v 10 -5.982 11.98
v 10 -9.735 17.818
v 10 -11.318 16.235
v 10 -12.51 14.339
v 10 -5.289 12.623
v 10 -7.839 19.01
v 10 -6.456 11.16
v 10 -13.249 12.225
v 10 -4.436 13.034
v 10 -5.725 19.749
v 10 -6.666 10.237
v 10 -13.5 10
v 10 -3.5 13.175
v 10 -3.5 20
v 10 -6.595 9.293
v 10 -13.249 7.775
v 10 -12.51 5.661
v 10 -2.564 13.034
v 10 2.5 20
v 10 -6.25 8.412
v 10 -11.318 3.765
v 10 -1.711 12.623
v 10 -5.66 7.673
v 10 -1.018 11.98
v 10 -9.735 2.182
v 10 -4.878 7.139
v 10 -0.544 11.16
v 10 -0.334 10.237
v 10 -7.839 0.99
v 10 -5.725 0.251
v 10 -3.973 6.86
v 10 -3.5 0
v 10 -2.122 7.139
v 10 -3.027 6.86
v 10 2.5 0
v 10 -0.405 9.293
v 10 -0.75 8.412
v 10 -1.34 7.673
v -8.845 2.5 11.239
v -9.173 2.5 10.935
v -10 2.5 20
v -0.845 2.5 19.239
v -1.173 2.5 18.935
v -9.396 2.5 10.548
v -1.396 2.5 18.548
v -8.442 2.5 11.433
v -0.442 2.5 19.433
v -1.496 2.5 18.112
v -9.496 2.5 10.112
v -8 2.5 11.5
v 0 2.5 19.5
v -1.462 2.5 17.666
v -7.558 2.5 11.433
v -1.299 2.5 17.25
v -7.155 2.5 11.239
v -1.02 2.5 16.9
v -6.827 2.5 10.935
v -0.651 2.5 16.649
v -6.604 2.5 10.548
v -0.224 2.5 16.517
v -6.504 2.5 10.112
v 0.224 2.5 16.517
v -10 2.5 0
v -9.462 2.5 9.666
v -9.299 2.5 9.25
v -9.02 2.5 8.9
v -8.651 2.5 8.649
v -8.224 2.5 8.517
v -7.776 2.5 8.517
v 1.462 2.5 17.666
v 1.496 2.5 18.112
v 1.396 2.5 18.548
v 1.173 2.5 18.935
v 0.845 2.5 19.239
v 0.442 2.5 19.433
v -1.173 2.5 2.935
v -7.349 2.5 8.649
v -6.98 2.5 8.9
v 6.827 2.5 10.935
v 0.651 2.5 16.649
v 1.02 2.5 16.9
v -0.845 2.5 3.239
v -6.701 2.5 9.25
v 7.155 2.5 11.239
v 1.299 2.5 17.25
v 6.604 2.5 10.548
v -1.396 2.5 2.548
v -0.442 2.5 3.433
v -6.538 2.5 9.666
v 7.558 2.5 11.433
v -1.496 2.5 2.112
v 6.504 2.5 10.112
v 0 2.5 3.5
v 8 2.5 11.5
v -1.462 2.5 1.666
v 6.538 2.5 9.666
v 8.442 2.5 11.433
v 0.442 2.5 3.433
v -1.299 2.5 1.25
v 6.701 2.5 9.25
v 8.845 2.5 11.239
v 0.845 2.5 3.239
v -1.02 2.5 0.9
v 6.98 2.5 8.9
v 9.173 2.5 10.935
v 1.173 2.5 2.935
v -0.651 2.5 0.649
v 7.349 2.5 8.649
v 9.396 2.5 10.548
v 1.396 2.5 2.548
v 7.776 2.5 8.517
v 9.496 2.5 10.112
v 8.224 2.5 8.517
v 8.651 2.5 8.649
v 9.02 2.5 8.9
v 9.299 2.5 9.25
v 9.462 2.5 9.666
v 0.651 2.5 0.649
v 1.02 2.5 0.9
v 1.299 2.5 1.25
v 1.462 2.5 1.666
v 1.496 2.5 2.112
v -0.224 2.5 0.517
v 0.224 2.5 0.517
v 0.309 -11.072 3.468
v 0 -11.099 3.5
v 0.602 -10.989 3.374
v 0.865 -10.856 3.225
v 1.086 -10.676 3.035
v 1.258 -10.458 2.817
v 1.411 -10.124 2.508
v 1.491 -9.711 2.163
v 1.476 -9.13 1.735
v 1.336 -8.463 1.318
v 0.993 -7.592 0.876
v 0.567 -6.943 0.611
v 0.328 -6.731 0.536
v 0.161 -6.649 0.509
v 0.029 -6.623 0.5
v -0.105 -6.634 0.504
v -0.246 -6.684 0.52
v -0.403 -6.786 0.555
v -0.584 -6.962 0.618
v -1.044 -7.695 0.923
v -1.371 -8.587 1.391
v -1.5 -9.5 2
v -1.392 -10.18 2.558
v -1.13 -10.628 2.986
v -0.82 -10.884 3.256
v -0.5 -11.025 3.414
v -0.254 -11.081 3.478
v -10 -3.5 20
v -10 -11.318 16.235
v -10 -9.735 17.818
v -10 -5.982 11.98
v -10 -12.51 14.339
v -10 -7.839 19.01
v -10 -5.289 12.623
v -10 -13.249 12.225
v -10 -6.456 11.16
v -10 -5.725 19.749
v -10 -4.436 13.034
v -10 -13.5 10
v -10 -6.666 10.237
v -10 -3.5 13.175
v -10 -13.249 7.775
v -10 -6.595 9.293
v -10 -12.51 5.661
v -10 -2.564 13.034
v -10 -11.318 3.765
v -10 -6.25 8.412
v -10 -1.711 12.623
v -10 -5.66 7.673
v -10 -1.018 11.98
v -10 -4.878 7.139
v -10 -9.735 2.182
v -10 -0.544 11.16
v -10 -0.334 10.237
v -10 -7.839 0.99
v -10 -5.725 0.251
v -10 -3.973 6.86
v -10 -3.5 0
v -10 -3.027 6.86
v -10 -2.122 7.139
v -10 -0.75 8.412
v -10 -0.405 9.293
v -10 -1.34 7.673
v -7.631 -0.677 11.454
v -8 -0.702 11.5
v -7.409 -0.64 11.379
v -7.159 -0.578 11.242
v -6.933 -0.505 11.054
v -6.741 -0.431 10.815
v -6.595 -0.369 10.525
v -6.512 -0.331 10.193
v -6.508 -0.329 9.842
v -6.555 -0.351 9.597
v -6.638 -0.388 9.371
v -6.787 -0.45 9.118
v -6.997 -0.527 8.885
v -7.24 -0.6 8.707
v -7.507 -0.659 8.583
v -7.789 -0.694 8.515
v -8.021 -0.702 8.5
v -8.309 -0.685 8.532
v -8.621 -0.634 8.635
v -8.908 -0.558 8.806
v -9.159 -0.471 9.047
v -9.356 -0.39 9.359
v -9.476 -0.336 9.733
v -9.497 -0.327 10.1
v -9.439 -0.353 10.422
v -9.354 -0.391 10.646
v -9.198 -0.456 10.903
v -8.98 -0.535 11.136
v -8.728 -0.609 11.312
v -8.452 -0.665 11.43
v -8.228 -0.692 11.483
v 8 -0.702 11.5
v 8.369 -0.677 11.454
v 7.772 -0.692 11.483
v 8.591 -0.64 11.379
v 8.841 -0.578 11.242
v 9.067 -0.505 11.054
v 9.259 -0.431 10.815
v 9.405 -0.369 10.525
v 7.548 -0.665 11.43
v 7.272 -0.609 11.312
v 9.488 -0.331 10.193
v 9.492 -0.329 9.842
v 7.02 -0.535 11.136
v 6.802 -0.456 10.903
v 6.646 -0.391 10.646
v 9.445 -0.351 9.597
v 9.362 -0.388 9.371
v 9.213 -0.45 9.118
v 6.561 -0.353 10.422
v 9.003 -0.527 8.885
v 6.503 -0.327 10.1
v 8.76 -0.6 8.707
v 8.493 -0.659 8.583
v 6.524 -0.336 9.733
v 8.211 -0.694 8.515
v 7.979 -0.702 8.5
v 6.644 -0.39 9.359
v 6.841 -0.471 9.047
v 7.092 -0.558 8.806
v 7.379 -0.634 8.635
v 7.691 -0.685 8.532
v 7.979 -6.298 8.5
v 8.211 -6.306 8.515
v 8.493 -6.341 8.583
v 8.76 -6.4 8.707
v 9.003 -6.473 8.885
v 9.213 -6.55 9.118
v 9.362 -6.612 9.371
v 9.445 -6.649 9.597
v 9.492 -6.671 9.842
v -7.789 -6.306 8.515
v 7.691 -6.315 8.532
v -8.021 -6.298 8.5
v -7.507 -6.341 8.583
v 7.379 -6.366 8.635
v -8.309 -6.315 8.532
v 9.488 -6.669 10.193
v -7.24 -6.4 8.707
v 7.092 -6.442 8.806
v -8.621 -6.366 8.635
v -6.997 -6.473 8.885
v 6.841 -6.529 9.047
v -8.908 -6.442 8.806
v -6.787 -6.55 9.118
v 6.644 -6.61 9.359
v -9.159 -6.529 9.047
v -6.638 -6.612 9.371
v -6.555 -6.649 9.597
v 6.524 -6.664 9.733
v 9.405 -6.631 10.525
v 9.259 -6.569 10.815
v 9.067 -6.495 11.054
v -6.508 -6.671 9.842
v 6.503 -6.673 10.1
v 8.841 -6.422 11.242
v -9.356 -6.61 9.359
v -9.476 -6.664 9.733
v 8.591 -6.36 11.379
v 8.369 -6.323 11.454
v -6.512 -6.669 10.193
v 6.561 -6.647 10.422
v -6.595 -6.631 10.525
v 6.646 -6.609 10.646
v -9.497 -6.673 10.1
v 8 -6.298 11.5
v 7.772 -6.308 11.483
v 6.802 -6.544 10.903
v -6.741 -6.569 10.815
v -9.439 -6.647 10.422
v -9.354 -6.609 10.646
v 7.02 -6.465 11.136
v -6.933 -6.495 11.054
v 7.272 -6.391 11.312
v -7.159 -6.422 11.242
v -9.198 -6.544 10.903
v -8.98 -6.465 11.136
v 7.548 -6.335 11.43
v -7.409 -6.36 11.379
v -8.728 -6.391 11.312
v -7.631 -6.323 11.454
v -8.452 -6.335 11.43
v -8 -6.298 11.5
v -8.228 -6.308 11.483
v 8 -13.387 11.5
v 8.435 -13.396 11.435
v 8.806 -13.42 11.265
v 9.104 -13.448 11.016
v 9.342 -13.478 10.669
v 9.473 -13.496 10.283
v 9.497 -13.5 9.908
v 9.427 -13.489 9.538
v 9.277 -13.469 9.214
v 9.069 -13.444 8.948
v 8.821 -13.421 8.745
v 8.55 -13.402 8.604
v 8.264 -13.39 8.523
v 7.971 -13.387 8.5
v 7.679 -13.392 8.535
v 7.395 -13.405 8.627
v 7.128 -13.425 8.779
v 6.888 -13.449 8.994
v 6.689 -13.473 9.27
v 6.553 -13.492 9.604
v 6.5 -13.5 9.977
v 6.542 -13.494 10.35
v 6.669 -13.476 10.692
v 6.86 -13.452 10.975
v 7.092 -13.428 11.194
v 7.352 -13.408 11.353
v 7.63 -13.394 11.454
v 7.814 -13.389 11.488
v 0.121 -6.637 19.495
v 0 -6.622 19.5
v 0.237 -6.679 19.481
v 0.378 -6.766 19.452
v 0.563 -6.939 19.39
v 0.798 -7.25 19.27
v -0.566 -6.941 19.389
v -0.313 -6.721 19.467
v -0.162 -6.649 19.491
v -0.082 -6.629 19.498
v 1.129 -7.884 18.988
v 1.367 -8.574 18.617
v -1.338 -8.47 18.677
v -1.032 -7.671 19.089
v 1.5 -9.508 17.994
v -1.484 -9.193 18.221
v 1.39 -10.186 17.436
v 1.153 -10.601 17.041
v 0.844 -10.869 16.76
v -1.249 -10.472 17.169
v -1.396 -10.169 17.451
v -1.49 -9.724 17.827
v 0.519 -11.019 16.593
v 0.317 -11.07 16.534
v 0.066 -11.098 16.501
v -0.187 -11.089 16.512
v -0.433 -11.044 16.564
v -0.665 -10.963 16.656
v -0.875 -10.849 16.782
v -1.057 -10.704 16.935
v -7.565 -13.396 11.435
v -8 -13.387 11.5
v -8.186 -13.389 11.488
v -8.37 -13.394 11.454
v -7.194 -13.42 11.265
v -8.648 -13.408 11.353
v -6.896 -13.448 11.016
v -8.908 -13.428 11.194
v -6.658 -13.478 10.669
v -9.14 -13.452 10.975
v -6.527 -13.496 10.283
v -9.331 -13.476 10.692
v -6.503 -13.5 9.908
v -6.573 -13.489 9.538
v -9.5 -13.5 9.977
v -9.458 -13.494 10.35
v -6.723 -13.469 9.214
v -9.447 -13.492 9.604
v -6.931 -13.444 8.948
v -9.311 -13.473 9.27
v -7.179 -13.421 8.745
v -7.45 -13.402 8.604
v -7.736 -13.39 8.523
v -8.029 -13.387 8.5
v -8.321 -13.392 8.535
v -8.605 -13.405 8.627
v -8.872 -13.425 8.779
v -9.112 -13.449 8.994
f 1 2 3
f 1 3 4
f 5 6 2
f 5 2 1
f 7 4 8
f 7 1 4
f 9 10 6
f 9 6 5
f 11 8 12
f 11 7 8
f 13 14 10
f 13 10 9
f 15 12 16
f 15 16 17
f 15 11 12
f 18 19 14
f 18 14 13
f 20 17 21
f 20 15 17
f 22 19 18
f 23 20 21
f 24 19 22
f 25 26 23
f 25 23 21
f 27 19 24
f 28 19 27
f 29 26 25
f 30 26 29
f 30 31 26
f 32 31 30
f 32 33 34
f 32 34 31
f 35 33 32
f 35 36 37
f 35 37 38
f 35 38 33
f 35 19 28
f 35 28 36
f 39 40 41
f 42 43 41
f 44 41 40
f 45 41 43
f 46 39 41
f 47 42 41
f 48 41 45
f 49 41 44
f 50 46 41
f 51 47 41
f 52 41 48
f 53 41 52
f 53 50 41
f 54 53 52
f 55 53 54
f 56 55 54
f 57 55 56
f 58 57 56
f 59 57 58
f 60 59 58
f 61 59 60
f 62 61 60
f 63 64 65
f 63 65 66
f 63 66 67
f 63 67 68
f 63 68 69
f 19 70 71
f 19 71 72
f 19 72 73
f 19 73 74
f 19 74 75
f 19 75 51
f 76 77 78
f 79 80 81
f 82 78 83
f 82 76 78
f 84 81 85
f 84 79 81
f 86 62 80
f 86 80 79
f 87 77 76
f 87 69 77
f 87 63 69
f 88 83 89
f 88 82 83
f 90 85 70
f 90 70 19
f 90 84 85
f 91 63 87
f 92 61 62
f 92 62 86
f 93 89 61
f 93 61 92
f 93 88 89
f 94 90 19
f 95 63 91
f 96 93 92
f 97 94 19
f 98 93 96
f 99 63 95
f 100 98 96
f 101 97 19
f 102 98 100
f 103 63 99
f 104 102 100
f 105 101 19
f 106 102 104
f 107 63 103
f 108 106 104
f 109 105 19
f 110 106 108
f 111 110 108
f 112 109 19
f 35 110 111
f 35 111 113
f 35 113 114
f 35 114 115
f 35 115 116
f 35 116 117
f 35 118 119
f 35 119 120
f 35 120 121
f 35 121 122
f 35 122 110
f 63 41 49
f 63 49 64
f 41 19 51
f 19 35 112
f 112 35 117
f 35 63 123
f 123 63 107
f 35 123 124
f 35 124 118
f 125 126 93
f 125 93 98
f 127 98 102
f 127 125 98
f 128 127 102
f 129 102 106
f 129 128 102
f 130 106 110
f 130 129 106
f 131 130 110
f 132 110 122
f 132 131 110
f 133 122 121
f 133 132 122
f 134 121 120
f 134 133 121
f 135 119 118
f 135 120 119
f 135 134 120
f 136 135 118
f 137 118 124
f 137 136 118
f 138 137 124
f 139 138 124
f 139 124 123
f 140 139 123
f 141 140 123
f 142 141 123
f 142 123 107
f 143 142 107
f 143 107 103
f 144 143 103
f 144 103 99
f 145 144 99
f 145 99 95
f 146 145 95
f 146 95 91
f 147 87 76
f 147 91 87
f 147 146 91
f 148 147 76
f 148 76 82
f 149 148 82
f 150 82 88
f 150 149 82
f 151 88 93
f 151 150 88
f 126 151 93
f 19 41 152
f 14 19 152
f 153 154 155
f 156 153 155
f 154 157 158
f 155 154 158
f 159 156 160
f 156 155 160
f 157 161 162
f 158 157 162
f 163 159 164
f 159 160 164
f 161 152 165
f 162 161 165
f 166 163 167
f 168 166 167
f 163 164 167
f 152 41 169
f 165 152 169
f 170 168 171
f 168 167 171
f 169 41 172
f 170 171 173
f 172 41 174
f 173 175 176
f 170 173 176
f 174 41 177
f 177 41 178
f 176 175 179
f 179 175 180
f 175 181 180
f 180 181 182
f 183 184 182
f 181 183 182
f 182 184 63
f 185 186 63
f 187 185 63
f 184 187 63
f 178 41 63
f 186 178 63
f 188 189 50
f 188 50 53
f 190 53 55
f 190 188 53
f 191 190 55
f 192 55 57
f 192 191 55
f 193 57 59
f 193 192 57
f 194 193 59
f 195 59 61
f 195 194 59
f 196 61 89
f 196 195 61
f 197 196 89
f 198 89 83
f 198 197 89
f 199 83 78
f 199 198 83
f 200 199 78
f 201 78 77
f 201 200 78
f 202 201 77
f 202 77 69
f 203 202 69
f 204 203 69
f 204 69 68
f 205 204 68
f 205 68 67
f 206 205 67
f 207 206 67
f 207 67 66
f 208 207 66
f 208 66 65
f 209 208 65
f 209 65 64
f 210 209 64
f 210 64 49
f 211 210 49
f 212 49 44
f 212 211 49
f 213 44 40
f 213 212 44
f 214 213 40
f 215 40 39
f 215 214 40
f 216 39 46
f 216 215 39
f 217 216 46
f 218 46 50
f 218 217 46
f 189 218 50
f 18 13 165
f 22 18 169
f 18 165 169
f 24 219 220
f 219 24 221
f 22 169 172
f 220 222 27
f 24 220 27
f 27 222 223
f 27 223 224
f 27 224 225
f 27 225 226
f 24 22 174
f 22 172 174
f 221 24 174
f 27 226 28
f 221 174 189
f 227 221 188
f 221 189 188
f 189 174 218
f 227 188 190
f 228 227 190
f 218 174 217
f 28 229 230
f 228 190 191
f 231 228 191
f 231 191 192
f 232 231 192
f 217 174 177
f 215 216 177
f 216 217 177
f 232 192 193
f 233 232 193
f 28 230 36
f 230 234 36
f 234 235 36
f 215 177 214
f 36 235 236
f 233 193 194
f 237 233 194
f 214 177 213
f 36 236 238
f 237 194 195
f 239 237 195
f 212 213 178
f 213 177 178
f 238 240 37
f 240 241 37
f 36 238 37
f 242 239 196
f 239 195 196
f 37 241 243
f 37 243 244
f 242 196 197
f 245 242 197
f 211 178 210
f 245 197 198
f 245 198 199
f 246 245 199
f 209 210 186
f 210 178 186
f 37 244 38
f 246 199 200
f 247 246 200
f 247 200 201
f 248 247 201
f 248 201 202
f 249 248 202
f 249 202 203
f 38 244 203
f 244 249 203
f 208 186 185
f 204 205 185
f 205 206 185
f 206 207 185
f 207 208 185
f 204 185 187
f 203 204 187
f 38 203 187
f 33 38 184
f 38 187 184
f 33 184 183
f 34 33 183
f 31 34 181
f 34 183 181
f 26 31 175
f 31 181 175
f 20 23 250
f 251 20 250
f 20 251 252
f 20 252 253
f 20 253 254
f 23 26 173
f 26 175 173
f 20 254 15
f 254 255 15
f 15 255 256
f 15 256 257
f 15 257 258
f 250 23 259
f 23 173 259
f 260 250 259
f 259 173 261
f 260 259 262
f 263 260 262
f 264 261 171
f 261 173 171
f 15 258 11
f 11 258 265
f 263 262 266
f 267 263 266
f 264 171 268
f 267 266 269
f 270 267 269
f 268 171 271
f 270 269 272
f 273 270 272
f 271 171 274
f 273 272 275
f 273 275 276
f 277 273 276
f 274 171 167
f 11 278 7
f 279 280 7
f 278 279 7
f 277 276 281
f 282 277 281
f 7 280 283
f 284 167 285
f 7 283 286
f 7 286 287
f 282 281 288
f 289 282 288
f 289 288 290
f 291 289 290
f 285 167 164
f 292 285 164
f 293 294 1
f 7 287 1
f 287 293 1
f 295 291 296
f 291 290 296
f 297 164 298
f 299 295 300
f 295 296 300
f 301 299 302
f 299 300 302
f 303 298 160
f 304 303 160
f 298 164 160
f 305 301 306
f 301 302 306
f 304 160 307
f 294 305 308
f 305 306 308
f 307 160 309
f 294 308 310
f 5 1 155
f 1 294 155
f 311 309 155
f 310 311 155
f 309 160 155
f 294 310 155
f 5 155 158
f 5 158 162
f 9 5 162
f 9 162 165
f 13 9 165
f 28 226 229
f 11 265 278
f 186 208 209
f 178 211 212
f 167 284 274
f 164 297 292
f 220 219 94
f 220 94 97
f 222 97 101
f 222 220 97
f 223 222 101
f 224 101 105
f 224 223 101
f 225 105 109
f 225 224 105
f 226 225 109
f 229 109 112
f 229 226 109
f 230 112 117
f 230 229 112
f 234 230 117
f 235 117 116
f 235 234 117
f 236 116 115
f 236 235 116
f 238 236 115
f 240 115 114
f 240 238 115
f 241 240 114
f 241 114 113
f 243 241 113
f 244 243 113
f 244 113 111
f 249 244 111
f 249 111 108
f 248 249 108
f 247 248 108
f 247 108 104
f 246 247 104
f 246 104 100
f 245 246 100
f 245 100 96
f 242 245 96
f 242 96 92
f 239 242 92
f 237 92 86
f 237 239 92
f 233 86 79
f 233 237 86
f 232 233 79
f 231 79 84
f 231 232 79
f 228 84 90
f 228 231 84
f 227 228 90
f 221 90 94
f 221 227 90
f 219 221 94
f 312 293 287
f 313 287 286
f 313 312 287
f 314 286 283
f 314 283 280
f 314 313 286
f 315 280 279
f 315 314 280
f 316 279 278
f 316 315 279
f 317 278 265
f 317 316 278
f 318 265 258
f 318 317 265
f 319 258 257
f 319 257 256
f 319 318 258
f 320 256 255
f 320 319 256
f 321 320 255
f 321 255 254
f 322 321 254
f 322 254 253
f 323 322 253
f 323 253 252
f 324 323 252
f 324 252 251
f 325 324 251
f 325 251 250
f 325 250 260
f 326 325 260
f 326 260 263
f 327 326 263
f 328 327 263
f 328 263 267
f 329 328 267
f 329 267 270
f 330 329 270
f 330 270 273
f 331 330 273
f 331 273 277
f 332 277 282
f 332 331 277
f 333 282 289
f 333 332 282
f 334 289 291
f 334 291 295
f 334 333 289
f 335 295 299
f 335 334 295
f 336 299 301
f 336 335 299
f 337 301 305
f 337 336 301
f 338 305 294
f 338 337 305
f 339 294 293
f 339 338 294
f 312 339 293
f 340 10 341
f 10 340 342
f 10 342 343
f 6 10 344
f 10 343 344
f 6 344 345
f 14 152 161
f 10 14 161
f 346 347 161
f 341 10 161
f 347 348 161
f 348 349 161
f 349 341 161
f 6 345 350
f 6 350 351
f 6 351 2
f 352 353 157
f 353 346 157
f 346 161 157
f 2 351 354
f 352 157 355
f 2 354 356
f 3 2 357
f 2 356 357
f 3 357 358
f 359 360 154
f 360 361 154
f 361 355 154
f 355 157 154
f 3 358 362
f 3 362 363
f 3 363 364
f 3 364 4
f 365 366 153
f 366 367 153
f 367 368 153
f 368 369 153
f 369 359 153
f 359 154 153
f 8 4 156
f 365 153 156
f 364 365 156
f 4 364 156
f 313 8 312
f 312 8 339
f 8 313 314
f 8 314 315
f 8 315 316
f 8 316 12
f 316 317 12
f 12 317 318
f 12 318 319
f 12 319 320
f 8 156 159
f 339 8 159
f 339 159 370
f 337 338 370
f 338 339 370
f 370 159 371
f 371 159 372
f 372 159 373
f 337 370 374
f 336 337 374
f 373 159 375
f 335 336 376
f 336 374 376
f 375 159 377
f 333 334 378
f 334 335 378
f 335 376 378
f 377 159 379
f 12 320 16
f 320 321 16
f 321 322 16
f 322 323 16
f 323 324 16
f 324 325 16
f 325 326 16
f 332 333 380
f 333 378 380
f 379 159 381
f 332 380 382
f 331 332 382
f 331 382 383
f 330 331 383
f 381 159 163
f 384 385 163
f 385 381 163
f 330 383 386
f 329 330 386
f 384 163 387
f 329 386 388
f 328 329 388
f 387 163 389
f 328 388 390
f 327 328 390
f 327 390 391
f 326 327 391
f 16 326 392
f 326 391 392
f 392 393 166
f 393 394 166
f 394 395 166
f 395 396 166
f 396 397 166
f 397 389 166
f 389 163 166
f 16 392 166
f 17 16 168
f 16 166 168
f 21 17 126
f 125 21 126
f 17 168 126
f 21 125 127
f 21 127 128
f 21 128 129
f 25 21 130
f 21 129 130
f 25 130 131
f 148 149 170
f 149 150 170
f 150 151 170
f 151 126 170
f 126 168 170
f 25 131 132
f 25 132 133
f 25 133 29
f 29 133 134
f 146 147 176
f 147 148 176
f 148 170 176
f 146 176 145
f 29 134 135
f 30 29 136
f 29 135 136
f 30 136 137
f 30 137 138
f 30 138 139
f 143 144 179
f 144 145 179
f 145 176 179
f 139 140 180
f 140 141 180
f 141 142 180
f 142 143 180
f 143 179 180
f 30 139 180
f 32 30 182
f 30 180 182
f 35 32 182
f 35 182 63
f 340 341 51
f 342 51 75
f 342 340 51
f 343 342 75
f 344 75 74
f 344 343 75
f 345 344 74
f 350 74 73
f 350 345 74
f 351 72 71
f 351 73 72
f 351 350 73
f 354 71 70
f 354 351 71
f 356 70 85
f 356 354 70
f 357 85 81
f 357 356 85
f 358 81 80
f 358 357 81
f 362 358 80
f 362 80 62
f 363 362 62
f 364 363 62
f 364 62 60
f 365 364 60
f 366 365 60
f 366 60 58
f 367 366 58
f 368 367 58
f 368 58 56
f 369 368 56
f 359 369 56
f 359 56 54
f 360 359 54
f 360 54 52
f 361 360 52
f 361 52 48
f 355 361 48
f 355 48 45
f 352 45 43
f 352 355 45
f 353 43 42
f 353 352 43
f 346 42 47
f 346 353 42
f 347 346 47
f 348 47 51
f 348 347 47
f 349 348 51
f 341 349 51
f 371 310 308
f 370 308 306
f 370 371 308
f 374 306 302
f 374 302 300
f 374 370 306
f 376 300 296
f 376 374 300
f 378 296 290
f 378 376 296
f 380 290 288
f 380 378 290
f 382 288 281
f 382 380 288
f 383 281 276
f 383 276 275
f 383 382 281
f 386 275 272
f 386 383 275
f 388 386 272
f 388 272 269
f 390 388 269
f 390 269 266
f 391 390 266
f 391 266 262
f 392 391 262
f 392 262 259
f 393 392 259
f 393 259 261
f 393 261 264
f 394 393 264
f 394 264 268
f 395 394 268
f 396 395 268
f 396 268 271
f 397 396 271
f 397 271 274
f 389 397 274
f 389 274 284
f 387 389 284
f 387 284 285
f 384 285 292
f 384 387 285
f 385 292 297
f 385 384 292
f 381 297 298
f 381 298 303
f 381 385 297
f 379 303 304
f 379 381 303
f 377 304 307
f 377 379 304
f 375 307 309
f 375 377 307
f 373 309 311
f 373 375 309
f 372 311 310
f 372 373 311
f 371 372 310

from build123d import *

# Parameters (mm, degrees)
SKETCH1_W               = 20
SKETCH1_H               = 20
SKETCH1_R               = 1.5
SKETCH1_R_2             = 8
BOSS_EXTRUDE1_DEPTH     = 2.5
SKETCH2_R               = 3.175
BOSS_EXTRUDE2_DEPTH     = 20
CUT_EXTRUDE2_DEPTH      = 27.119915773
CUT_EXTRUDE2_DEPTH_BACK = 27.119915773
SKETCH1_3_R             = 1.5


with BuildPart() as part:
    # Sketch1 → Boss-Extrude1 (new body)
    # profile 1 of 18: a face of its own
    with BuildSketch(Plane(origin=(0, 0, 0), x_dir=(1, 0, 0), z_dir=(0, 1, 0))):
        with Locations((0, -10)):
            Rectangle(SKETCH1_W, SKETCH1_H)
        with Locations((0, -2)):
            Circle(SKETCH1_R, mode=Mode.SUBTRACT)
        with Locations((0, -10)):
            Circle(SKETCH1_R_2, mode=Mode.SUBTRACT)
        with Locations((8, -10)):
            Circle(SKETCH1_R, mode=Mode.SUBTRACT)
        with Locations((0, -18)):
            Circle(SKETCH1_R, mode=Mode.SUBTRACT)
        with Locations((-8, -10)):
            Circle(SKETCH1_R, mode=Mode.SUBTRACT)
    # profile 2 of 18: a face of its own
    with BuildSketch(Plane(origin=(0, 0, 0), x_dir=(1, 0, 0), z_dir=(0, 1, 0))):
        with Locations((8, -10)):
            Circle(SKETCH1_R)
    # profile 3 of 18: a face of its own
    with BuildSketch(Plane(origin=(0, 0, 0), x_dir=(1, 0, 0), z_dir=(0, 1, 0))):
        with Locations((0, -18)):
            Circle(SKETCH1_R)
    # profile 4 of 18: a face of its own
    with BuildSketch(Plane(origin=(0, 0, 0), x_dir=(1, 0, 0), z_dir=(0, 1, 0))):
        with Locations((-8, -10)):
            Circle(SKETCH1_R)
    # profile 5 of 18: a face of its own
    with BuildSketch(Plane(origin=(0, 0, 0), x_dir=(1, 0, 0), z_dir=(0, 1, 0))):
        with Locations((0, -10)):
            Circle(SKETCH1_R_2)
    # profile 6 of 18: a face of its own
    with BuildSketch(Plane(origin=(0, 0, 0), x_dir=(1, 0, 0), z_dir=(0, 1, 0))):
        with Locations((0, -2)):
            Circle(SKETCH1_R)
    # profile 7 of 18: a face of its own
    with BuildSketch(Plane(origin=(0, 0, 0), x_dir=(1, 0, 0), z_dir=(0, 1, 0))):
        with Locations((0, -10)):
            Circle(SKETCH1_R_2)
    # profile 8 of 18: a face of its own
    with BuildSketch(Plane(origin=(0, 0, 0), x_dir=(1, 0, 0), z_dir=(0, 1, 0))):
        with Locations((8, -10)):
            Circle(SKETCH1_R)
    # profile 9 of 18: a face of its own
    with BuildSketch(Plane(origin=(0, 0, 0), x_dir=(1, 0, 0), z_dir=(0, 1, 0))):
        with Locations((0, -10)):
            Circle(SKETCH1_R_2)
    # profile 10 of 18: a face of its own
    with BuildSketch(Plane(origin=(0, 0, 0), x_dir=(1, 0, 0), z_dir=(0, 1, 0))):
        with Locations((0, -18)):
            Circle(SKETCH1_R)
    # profile 11 of 18: a face of its own
    with BuildSketch(Plane(origin=(0, 0, 0), x_dir=(1, 0, 0), z_dir=(0, 1, 0))):
        with Locations((0, -10)):
            Circle(SKETCH1_R_2)
    # profile 12 of 18: a face of its own
    with BuildSketch(Plane(origin=(0, 0, 0), x_dir=(1, 0, 0), z_dir=(0, 1, 0))):
        with Locations((0, -18)):
            Circle(SKETCH1_R)
    # profile 13 of 18: a face of its own
    with BuildSketch(Plane(origin=(0, 0, 0), x_dir=(1, 0, 0), z_dir=(0, 1, 0))):
        with Locations((0, -10)):
            Circle(SKETCH1_R_2)
    # profile 14 of 18: a face of its own
    with BuildSketch(Plane(origin=(0, 0, 0), x_dir=(1, 0, 0), z_dir=(0, 1, 0))):
        with Locations((-8, -10)):
            Circle(SKETCH1_R)
    # profile 15 of 18: a face of its own
    with BuildSketch(Plane(origin=(0, 0, 0), x_dir=(1, 0, 0), z_dir=(0, 1, 0))):
        with Locations((0, -10)):
            Circle(SKETCH1_R_2)
    # profile 16 of 18: a face of its own
    with BuildSketch(Plane(origin=(0, 0, 0), x_dir=(1, 0, 0), z_dir=(0, 1, 0))):
        with Locations((-8, -10)):
            Circle(SKETCH1_R)
    # profile 17 of 18: a face of its own
    with BuildSketch(Plane(origin=(0, 0, 0), x_dir=(1, 0, 0), z_dir=(0, 1, 0))):
        with Locations((0, -10)):
            Circle(SKETCH1_R_2)
    # profile 18 of 18: a face of its own
    with BuildSketch(Plane(origin=(0, 0, 0), x_dir=(1, 0, 0), z_dir=(0, 1, 0))):
        with Locations((8, -10)):
            Circle(SKETCH1_R)
    extrude(amount=BOSS_EXTRUDE1_DEPTH)

    # Sketch2 → Boss-Extrude2 (add)
    with BuildSketch(Plane.ZY.offset(10)):
        with BuildLine():
            Line((0, 0), (20, 0))
            Line((20, 0), (20, -3.5))
            ThreePointArc((20, -3.5), (10, -13.5), (0, -3.5))
            Line((0, -3.5), (0, 0))
        make_face()
        with Locations((10, -3.5)):
            Circle(SKETCH2_R, mode=Mode.SUBTRACT)
    extrude(amount=-BOSS_EXTRUDE2_DEPTH)

    # Sketch1<3> → Cut-Extrude2 (cut, two sides: drawn at the far end of the back side and taken through both)
    with BuildSketch(Plane(origin=(0, 0, 0), x_dir=(1, 0, 0), z_dir=(0, 1, 0)).offset(-CUT_EXTRUDE2_DEPTH_BACK)):
        with Locations(Location((8, -10, 0), (0, 0, 270))):
            Circle(SKETCH1_3_R)
        with Locations(Location((0, -18, 0), (0, 0, 270))):
            Circle(SKETCH1_3_R)
        with Locations(Location((-8, -10, 0), (0, 0, 270))):
            Circle(SKETCH1_3_R)
        with Locations(Location((0, -2, 0), (0, 0, 270))):
            Circle(SKETCH1_3_R)
    extrude(amount=CUT_EXTRUDE2_DEPTH + CUT_EXTRUDE2_DEPTH_BACK, mode=Mode.SUBTRACT)


solid = part.part
